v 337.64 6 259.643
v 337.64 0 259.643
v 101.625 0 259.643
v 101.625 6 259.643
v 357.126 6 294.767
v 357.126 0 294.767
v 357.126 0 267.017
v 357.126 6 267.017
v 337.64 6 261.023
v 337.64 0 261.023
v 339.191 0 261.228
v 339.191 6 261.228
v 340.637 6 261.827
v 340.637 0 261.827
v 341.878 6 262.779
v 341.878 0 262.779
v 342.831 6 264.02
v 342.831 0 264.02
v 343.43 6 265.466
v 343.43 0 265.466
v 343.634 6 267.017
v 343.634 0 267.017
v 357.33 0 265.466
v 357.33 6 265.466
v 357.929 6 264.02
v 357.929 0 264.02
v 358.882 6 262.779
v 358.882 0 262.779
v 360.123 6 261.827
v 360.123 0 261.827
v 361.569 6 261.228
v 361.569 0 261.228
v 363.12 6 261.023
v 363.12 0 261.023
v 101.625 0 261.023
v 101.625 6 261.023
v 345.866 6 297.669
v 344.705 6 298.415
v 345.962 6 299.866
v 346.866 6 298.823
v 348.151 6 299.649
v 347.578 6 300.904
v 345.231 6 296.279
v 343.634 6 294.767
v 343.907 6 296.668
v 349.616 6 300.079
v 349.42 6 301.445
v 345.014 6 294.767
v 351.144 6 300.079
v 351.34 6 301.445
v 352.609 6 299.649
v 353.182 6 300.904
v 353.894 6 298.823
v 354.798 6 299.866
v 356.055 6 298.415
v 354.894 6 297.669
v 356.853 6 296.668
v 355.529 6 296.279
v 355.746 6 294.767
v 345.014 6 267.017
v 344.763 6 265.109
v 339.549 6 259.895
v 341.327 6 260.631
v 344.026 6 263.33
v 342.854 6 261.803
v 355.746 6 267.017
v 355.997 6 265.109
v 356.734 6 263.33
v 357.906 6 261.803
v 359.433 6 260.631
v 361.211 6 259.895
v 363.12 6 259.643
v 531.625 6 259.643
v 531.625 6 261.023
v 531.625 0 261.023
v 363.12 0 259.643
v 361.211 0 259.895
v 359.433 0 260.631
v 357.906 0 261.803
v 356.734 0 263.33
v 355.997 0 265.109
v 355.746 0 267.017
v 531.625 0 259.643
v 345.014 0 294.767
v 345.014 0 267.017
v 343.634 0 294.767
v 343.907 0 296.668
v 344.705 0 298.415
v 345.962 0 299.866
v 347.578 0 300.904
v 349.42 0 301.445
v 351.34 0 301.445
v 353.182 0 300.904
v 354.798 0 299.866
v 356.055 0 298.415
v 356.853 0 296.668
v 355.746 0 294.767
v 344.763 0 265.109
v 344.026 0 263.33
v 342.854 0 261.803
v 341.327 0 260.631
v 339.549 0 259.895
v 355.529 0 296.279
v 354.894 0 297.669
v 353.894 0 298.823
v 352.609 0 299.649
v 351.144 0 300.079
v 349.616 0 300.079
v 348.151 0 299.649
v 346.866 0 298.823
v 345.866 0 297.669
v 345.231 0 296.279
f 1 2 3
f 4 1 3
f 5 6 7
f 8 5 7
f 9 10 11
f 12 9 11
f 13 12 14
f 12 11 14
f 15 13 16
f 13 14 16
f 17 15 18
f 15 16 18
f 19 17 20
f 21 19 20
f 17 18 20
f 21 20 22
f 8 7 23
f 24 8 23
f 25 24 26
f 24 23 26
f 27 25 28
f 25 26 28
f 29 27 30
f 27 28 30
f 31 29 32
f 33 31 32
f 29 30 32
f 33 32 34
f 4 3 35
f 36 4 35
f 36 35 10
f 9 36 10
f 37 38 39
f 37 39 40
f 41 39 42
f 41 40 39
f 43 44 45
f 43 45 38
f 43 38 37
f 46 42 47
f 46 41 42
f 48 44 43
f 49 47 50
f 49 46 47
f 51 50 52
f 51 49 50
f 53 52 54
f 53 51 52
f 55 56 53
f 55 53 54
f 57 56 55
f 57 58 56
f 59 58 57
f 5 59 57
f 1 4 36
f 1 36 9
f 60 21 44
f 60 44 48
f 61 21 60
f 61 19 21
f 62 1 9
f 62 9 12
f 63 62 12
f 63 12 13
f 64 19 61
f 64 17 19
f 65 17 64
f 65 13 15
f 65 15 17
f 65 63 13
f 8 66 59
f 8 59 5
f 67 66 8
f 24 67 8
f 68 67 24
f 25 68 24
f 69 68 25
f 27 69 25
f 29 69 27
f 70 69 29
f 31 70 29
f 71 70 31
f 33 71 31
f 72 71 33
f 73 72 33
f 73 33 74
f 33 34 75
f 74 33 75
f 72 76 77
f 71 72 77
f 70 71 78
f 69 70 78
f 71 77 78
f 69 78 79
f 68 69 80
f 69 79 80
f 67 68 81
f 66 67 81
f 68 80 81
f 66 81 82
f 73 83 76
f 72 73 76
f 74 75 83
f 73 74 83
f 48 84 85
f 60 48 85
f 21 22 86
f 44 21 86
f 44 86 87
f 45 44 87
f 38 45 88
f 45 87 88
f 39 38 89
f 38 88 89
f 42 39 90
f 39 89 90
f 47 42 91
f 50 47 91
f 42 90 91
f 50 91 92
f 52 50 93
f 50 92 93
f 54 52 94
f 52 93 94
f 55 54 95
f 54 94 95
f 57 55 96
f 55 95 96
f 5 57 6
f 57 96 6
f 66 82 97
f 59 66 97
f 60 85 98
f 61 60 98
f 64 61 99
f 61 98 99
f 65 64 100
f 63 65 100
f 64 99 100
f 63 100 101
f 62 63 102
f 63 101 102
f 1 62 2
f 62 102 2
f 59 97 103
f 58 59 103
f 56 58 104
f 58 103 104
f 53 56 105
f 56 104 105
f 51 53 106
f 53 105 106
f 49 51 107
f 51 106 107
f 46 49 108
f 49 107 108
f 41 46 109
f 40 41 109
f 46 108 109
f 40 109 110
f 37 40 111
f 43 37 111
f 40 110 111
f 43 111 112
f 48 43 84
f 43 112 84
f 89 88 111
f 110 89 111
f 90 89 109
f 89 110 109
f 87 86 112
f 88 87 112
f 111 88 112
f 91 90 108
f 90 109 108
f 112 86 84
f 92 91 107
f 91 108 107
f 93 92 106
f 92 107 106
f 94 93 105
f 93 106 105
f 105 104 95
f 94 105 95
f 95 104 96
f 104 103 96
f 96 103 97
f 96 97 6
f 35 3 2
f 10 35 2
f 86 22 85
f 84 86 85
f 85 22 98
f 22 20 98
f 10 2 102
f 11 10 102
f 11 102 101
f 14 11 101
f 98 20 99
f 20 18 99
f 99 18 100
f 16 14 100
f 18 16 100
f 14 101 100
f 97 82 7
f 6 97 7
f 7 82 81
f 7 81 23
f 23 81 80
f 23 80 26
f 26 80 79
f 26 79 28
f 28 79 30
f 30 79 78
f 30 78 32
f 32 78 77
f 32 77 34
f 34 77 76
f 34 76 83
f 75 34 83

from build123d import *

# Parameters (mm, degrees)
EXTRUDE_THIN1_DEPTH = 6


with BuildPart() as part:
    # Sketch1 → Extrude-Thin1 (new body)
    with BuildSketch(Plane(origin=(0, 0, 0), x_dir=(1, 0, 0), z_dir=(0, 1, 0))):
        with BuildLine():
            Line((531.62539661, -259.643481844), (363.12, -259.643481844))
            ThreePointArc((363.12, -259.643481844), (357.905794596, -261.80327644), (355.746, -267.017481844))
            Line((355.746, -267.017481844), (355.746, -294.767481844))
            ThreePointArc((355.746, -294.767481844), (350.38, -300.133481844), (345.014, -294.767481844))
            Line((345.014, -294.767481844), (345.014, -267.017481844))
            ThreePointArc((345.014, -267.017481844), (342.854205404, -261.80327644), (337.64, -259.643481844))
            Line((337.64, -259.643481844), (101.625, -259.643481844))
            Line((101.625, -259.643481844), (101.625, -261.023481844))
            Line((101.625, -261.023481844), (337.64, -261.023481844))
            ThreePointArc((337.64, -261.023481844), (341.878398046, -262.779083798), (343.634, -267.017481844))
            Line((343.634, -267.017481844), (343.634, -294.767481844))
            ThreePointArc((343.634, -294.767481844), (350.38, -301.513481844), (357.126, -294.767481844))
            Line((357.126, -294.767481844), (357.126, -267.017481844))
            ThreePointArc((357.126, -267.017481844), (358.881601954, -262.779083798), (363.12, -261.023481844))
            Line((363.12, -261.023481844), (531.62539661, -261.023481844))
            Line((531.62539661, -261.023481844), (531.62539661, -259.643481844))
        make_face()
    extrude(amount=EXTRUDE_THIN1_DEPTH)


solid = part.part
